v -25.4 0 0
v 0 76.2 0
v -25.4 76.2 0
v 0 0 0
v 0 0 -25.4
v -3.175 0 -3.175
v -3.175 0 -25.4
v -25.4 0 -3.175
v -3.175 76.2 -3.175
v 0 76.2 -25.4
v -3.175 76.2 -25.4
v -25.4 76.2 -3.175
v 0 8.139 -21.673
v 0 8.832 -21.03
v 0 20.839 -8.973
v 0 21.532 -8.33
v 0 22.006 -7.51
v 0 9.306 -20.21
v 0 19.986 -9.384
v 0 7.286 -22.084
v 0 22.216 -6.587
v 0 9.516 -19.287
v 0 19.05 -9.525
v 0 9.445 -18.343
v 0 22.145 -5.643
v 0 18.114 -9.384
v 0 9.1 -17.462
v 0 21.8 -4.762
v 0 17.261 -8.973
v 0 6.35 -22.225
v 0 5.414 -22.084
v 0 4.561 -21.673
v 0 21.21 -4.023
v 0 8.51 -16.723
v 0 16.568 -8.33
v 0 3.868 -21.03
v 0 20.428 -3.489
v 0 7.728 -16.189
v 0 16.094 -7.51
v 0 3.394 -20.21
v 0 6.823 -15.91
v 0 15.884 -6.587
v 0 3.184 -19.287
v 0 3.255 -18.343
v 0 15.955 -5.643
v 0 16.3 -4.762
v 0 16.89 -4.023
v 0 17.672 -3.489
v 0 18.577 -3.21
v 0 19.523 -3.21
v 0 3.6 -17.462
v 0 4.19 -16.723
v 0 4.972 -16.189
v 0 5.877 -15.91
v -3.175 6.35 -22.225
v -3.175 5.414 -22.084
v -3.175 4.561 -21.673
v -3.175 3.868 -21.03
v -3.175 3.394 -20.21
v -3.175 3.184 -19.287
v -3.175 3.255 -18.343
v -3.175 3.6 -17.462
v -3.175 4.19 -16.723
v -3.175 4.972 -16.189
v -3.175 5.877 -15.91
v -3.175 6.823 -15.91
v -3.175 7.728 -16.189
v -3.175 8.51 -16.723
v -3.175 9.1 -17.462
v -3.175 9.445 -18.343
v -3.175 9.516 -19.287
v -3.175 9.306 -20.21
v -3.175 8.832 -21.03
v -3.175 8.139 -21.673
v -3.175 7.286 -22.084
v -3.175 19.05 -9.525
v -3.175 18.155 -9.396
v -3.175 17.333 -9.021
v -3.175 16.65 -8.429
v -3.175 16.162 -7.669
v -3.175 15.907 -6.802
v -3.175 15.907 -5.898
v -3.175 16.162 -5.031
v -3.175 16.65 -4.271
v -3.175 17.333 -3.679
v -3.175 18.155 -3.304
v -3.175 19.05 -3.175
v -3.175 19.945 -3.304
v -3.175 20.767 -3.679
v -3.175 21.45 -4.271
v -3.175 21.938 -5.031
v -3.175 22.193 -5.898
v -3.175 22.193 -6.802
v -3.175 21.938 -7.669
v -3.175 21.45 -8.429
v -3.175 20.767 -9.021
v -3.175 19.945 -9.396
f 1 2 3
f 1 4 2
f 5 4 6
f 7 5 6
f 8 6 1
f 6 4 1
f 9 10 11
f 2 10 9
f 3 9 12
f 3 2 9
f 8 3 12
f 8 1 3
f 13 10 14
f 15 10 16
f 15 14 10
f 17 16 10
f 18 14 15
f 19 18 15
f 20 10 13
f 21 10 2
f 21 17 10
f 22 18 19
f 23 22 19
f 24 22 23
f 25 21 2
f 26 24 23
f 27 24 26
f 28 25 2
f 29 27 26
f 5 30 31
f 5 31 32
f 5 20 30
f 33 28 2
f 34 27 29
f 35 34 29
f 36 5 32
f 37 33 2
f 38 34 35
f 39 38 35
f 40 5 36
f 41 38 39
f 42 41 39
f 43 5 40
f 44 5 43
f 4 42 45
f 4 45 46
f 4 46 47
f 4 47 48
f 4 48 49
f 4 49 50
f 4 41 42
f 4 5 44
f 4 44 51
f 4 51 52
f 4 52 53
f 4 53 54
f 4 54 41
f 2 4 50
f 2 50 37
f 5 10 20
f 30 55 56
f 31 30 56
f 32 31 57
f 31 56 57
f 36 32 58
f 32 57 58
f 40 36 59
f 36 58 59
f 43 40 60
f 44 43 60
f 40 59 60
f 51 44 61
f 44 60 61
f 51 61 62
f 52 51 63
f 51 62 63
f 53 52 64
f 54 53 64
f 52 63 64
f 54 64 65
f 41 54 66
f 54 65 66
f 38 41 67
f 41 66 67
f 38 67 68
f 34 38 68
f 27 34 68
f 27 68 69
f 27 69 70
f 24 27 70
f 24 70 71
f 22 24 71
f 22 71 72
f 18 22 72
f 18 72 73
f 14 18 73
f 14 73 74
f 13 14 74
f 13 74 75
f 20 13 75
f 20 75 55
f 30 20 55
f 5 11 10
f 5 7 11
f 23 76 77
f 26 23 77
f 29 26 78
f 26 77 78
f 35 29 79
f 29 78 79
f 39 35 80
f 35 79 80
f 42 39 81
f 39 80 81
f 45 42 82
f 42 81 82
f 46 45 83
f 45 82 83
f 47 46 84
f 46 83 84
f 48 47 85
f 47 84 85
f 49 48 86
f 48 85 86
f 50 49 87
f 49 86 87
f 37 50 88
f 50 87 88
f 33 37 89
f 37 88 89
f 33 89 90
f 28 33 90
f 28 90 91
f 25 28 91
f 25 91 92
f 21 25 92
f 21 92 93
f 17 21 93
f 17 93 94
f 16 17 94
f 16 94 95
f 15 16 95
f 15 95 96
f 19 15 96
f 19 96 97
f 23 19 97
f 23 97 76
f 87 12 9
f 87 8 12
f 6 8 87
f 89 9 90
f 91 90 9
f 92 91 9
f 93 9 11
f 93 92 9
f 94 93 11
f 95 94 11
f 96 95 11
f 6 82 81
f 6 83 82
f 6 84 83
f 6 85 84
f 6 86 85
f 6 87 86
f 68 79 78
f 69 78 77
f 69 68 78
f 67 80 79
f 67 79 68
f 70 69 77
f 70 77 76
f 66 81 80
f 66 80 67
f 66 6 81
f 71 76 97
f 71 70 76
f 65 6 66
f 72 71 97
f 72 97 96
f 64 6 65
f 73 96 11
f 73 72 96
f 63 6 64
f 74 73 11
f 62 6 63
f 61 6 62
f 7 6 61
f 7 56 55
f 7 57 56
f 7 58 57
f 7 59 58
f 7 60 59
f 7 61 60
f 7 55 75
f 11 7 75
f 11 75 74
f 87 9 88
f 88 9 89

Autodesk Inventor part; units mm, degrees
ref_plane "YZ Plane" through (0, 0, 0) normal (1, 0, 0) x (0, 1, 0)
ref_plane "XZ Plane" through (0, 0, 0) normal (0, 1, 0) x (-1, 0, 0)
ref_plane "XY Plane" through (0, 0, 0) normal (0, 0, 1) x (1, 0, 0)
sketch "Sketch1" plane through (0, 0, 0) normal (0, 1, 0) x (-1, 0, 0)
  line L0 (0, 0) -> (25.4, 0)
  line L1 (25.4, 0) -> (25.4, -3.175)
  line L2 (25.4, -3.175) -> (0, -3.175)
  line L3 (0, -3.175) -> (0, 0)
  line L4 (0, 0) -> (3.175, 0)
  line L5 (3.175, 0) -> (3.175, -25.4)
  line L6 (3.175, -25.4) -> (0, -25.4)
  line L7 (0, -25.4) -> (0, 0)
  dimension "d0" = 25.4
  dimension "d1" = 3.175
  dimension "d2" = 3.175
  dimension "d3" = 25.4
extrude "Extrusion1" add sketch "Sketch1" along normal blind 76.2
sketch "Sketch2" plane through (0, 0, 0) normal (1, 0, 0) x (0, 0, -1)
  line L0 (0, 0) -> (25.4, 0) projected
  line L1 (25.4, 0) -> (25.4, 76.2) projected
  point P0 (19.05, 6.35)
  point P1 (6.35, 19.05)
  dimension "d6" = 6.35
  dimension "d7" = 6.35
  dimension "d8" = 19.05
  dimension "d9" = 19.05
hole "Hole1" at (0, 6.35, -19.05) at (0, 19.05, -6.35) direction (-1, 0, 0) diameter 6.35 end through all
properties part number "1x1 angle mechanical stop"
